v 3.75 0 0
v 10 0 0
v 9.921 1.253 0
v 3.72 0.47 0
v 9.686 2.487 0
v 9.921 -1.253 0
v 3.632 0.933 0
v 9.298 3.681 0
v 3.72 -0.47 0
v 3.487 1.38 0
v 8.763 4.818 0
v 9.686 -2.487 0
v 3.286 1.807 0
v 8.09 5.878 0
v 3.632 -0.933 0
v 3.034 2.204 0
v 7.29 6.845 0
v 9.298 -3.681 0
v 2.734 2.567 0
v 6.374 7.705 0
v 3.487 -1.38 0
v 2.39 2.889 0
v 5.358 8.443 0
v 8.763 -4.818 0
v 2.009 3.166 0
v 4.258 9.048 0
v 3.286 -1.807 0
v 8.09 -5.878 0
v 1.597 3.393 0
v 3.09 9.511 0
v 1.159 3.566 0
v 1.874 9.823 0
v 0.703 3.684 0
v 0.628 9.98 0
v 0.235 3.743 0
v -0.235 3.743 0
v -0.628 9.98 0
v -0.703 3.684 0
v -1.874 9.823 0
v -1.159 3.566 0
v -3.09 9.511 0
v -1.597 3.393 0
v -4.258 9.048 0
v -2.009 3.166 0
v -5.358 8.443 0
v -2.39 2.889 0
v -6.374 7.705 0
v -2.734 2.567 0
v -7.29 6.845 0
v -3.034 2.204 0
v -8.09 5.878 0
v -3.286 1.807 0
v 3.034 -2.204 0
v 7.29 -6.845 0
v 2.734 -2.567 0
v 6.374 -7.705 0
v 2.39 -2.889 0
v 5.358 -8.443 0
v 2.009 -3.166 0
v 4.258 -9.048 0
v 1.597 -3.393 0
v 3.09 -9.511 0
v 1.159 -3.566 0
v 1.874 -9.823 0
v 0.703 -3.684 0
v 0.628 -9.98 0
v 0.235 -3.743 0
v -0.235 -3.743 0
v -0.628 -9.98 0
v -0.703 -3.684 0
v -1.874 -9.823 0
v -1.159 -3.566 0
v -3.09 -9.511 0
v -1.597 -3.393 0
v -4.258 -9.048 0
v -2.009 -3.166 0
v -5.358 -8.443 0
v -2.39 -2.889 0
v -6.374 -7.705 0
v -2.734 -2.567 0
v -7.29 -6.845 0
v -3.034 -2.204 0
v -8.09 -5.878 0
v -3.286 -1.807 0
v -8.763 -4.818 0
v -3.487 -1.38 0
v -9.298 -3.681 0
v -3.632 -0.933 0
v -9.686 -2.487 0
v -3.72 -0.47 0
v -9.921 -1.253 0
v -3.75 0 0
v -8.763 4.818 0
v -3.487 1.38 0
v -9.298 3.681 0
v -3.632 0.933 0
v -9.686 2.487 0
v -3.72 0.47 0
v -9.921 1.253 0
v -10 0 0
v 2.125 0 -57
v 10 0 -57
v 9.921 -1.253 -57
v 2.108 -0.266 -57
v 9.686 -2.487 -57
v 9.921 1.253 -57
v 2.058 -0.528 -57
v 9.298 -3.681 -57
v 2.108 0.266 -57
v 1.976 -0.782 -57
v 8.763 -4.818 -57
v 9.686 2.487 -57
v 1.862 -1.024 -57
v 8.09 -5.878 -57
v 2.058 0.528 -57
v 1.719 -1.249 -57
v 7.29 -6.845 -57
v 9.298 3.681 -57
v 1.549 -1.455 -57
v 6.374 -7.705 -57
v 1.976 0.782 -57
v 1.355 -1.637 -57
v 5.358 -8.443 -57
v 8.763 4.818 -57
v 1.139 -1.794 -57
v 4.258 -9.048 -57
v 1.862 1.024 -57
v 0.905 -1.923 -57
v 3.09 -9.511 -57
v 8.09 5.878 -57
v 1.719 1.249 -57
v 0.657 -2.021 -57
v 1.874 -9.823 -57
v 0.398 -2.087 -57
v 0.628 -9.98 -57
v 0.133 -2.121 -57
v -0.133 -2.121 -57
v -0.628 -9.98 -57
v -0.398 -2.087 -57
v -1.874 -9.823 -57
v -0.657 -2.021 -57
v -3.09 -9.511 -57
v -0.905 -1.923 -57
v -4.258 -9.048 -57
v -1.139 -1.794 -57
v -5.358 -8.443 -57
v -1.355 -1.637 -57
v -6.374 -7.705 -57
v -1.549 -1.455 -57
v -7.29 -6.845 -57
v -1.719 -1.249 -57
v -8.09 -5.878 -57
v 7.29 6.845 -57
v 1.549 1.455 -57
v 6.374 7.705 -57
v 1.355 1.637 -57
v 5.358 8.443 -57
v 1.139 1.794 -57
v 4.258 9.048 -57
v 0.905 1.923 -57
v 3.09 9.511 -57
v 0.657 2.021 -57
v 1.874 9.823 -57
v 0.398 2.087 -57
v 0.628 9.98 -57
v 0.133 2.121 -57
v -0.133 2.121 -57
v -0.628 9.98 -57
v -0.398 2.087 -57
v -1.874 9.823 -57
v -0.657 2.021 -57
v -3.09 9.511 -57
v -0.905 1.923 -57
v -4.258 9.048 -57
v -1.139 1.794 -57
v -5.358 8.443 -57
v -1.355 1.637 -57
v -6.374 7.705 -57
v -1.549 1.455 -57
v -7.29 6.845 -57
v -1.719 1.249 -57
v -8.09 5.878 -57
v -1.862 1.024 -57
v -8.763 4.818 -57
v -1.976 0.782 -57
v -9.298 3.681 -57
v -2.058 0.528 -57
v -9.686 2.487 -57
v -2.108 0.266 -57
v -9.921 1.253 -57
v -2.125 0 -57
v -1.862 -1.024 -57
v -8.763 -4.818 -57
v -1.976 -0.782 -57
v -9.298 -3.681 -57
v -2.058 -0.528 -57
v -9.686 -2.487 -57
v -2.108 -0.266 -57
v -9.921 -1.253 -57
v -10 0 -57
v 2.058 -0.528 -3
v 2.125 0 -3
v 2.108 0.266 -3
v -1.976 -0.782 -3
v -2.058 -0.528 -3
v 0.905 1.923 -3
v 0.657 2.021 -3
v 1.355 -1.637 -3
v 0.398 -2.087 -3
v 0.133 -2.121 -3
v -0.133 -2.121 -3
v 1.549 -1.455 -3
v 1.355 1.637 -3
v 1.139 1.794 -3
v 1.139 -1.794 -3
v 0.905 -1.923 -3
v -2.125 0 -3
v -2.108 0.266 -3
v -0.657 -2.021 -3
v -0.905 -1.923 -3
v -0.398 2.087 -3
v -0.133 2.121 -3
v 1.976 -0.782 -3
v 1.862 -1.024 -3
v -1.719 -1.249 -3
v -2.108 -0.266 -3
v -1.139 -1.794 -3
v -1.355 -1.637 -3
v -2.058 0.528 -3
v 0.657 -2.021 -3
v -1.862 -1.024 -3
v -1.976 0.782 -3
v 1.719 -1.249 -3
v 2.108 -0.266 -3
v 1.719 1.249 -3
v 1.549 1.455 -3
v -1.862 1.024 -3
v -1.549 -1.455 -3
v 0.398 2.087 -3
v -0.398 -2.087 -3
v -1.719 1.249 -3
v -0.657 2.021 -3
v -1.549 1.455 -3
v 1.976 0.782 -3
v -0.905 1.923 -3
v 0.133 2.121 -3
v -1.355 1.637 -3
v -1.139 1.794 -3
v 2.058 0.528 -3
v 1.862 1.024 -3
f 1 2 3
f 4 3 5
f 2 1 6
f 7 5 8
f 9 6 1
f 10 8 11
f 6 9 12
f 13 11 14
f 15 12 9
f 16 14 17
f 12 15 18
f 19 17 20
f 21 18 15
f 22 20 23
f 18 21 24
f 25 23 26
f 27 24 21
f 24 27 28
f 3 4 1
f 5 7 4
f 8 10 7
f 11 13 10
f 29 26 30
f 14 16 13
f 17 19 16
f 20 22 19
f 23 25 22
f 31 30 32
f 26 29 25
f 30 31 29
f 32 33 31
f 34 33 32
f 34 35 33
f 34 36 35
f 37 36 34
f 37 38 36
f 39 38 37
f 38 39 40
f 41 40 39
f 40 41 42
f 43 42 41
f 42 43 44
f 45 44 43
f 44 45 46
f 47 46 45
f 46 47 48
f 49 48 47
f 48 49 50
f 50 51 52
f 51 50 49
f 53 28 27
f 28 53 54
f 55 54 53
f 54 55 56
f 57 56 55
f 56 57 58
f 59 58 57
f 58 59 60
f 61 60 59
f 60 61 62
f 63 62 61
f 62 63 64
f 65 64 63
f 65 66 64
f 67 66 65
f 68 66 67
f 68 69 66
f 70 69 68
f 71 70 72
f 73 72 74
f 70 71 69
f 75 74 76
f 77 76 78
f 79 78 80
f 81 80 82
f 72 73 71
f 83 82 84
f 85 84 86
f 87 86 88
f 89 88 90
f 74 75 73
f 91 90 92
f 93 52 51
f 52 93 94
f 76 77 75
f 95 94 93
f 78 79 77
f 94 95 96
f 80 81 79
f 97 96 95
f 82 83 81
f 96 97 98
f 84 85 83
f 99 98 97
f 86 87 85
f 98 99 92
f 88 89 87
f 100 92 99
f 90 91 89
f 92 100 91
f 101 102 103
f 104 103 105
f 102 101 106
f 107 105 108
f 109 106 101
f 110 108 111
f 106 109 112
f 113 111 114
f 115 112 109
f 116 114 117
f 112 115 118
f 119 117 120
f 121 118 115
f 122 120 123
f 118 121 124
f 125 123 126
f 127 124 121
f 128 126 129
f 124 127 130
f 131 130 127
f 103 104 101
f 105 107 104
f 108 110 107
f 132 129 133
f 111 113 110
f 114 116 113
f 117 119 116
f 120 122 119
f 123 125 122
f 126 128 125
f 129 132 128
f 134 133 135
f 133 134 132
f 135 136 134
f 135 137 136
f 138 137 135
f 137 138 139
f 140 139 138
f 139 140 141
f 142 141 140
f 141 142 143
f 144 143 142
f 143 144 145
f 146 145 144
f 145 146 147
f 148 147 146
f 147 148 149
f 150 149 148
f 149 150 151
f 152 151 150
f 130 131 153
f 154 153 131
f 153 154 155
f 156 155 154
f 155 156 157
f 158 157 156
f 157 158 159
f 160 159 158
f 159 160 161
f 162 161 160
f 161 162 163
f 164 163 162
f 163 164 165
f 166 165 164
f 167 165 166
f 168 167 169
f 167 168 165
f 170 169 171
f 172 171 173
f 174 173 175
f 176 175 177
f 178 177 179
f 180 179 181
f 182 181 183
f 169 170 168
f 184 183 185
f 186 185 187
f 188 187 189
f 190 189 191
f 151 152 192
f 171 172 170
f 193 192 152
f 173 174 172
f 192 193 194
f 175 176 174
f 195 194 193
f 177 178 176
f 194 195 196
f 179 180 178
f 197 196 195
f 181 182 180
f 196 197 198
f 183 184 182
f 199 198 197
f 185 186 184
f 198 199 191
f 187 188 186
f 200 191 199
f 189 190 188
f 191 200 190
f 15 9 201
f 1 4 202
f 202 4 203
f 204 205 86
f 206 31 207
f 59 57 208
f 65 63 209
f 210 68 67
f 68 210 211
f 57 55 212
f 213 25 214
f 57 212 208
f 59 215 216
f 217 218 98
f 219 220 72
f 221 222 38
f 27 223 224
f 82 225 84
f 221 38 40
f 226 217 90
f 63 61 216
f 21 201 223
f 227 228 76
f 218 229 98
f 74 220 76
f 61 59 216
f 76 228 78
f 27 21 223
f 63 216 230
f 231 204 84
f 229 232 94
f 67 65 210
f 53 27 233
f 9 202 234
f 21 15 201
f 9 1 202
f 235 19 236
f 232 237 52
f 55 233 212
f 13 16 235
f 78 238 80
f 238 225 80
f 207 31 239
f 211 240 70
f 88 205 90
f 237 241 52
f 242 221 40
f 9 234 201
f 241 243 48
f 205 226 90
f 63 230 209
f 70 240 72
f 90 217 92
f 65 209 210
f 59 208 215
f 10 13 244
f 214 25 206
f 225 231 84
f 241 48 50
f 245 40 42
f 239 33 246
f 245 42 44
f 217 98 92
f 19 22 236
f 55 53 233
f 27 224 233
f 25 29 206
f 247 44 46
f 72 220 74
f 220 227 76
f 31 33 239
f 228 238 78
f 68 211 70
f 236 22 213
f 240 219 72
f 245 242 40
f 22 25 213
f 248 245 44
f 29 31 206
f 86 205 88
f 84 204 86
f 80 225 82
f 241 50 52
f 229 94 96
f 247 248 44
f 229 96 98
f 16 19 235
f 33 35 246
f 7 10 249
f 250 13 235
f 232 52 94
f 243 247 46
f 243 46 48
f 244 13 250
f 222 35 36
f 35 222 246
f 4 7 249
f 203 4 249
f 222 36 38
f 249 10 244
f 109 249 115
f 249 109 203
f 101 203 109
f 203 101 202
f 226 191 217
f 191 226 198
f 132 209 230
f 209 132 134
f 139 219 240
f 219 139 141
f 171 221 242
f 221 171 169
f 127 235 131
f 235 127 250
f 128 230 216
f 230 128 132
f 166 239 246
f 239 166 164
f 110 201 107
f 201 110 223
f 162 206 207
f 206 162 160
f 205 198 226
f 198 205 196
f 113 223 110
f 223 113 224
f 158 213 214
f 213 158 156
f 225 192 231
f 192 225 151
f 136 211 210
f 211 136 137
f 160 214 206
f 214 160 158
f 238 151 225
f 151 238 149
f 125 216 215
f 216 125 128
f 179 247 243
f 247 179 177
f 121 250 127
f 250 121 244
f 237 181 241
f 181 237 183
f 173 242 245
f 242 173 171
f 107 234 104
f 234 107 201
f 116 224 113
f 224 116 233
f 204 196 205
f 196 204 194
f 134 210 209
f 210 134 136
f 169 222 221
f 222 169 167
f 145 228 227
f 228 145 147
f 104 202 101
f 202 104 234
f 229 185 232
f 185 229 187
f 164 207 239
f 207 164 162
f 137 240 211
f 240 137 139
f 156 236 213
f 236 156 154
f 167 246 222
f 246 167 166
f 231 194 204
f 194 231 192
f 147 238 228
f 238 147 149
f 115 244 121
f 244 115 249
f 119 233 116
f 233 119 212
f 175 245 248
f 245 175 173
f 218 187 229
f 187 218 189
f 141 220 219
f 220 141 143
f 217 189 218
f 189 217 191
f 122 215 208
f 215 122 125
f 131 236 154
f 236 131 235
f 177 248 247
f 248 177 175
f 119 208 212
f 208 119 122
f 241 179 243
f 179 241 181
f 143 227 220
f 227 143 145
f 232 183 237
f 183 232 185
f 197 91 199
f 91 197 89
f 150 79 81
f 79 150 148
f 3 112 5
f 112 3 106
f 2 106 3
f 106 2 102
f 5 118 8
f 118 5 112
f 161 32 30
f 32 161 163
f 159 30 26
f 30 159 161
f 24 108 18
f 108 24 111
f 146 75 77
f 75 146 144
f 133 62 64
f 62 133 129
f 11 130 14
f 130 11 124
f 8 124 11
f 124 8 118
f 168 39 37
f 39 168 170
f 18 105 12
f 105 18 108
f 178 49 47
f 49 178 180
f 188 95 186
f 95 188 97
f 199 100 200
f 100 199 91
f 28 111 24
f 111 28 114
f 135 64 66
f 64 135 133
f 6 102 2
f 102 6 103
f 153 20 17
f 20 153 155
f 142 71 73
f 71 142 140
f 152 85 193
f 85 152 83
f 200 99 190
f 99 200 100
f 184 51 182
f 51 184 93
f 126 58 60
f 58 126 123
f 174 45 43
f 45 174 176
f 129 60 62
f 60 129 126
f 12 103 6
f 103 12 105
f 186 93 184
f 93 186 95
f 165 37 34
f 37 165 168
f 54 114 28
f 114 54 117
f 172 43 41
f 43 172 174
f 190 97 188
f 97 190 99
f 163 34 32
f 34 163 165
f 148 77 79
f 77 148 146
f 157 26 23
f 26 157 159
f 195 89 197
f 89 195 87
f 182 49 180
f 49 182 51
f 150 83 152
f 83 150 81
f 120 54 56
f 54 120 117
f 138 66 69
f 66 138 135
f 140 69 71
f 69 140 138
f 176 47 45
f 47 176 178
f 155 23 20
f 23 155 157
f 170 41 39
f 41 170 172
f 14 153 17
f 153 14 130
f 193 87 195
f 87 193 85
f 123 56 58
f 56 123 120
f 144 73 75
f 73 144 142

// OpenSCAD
$fn = 50;


difference() {
	union() {
		translate(v = [0, 0, -57.0000000000]) {
			cylinder(h = 57, r = 10.0000000000);
		}
		cylinder(h = 0, r = 16.0000000000);
	}
	union() {
		translate(v = [0, 0, 0]) {
			rotate(a = [0, 0, 0]) {
				difference() {
					union() {
						#translate(v = [0, 0, -57.0000000000]) {
							cylinder(h = 57, r = 2.0000000000);
						}
						#translate(v = [0, 0, -3]) {
							cylinder(h = 3, r = 10.0000000000, r1 = 2.1250000000, r2 = 3.7500000000);
						}
						#translate(v = [0, 0, -57.0000000000]) {
							cylinder(h = 57, r = 2.1250000000);
						}
						#translate(v = [0, 0, -57.0000000000]) {
							cylinder(h = 57, r = 2.0000000000);
						}
					}
					union();
				}
			}
		}
	}
}
